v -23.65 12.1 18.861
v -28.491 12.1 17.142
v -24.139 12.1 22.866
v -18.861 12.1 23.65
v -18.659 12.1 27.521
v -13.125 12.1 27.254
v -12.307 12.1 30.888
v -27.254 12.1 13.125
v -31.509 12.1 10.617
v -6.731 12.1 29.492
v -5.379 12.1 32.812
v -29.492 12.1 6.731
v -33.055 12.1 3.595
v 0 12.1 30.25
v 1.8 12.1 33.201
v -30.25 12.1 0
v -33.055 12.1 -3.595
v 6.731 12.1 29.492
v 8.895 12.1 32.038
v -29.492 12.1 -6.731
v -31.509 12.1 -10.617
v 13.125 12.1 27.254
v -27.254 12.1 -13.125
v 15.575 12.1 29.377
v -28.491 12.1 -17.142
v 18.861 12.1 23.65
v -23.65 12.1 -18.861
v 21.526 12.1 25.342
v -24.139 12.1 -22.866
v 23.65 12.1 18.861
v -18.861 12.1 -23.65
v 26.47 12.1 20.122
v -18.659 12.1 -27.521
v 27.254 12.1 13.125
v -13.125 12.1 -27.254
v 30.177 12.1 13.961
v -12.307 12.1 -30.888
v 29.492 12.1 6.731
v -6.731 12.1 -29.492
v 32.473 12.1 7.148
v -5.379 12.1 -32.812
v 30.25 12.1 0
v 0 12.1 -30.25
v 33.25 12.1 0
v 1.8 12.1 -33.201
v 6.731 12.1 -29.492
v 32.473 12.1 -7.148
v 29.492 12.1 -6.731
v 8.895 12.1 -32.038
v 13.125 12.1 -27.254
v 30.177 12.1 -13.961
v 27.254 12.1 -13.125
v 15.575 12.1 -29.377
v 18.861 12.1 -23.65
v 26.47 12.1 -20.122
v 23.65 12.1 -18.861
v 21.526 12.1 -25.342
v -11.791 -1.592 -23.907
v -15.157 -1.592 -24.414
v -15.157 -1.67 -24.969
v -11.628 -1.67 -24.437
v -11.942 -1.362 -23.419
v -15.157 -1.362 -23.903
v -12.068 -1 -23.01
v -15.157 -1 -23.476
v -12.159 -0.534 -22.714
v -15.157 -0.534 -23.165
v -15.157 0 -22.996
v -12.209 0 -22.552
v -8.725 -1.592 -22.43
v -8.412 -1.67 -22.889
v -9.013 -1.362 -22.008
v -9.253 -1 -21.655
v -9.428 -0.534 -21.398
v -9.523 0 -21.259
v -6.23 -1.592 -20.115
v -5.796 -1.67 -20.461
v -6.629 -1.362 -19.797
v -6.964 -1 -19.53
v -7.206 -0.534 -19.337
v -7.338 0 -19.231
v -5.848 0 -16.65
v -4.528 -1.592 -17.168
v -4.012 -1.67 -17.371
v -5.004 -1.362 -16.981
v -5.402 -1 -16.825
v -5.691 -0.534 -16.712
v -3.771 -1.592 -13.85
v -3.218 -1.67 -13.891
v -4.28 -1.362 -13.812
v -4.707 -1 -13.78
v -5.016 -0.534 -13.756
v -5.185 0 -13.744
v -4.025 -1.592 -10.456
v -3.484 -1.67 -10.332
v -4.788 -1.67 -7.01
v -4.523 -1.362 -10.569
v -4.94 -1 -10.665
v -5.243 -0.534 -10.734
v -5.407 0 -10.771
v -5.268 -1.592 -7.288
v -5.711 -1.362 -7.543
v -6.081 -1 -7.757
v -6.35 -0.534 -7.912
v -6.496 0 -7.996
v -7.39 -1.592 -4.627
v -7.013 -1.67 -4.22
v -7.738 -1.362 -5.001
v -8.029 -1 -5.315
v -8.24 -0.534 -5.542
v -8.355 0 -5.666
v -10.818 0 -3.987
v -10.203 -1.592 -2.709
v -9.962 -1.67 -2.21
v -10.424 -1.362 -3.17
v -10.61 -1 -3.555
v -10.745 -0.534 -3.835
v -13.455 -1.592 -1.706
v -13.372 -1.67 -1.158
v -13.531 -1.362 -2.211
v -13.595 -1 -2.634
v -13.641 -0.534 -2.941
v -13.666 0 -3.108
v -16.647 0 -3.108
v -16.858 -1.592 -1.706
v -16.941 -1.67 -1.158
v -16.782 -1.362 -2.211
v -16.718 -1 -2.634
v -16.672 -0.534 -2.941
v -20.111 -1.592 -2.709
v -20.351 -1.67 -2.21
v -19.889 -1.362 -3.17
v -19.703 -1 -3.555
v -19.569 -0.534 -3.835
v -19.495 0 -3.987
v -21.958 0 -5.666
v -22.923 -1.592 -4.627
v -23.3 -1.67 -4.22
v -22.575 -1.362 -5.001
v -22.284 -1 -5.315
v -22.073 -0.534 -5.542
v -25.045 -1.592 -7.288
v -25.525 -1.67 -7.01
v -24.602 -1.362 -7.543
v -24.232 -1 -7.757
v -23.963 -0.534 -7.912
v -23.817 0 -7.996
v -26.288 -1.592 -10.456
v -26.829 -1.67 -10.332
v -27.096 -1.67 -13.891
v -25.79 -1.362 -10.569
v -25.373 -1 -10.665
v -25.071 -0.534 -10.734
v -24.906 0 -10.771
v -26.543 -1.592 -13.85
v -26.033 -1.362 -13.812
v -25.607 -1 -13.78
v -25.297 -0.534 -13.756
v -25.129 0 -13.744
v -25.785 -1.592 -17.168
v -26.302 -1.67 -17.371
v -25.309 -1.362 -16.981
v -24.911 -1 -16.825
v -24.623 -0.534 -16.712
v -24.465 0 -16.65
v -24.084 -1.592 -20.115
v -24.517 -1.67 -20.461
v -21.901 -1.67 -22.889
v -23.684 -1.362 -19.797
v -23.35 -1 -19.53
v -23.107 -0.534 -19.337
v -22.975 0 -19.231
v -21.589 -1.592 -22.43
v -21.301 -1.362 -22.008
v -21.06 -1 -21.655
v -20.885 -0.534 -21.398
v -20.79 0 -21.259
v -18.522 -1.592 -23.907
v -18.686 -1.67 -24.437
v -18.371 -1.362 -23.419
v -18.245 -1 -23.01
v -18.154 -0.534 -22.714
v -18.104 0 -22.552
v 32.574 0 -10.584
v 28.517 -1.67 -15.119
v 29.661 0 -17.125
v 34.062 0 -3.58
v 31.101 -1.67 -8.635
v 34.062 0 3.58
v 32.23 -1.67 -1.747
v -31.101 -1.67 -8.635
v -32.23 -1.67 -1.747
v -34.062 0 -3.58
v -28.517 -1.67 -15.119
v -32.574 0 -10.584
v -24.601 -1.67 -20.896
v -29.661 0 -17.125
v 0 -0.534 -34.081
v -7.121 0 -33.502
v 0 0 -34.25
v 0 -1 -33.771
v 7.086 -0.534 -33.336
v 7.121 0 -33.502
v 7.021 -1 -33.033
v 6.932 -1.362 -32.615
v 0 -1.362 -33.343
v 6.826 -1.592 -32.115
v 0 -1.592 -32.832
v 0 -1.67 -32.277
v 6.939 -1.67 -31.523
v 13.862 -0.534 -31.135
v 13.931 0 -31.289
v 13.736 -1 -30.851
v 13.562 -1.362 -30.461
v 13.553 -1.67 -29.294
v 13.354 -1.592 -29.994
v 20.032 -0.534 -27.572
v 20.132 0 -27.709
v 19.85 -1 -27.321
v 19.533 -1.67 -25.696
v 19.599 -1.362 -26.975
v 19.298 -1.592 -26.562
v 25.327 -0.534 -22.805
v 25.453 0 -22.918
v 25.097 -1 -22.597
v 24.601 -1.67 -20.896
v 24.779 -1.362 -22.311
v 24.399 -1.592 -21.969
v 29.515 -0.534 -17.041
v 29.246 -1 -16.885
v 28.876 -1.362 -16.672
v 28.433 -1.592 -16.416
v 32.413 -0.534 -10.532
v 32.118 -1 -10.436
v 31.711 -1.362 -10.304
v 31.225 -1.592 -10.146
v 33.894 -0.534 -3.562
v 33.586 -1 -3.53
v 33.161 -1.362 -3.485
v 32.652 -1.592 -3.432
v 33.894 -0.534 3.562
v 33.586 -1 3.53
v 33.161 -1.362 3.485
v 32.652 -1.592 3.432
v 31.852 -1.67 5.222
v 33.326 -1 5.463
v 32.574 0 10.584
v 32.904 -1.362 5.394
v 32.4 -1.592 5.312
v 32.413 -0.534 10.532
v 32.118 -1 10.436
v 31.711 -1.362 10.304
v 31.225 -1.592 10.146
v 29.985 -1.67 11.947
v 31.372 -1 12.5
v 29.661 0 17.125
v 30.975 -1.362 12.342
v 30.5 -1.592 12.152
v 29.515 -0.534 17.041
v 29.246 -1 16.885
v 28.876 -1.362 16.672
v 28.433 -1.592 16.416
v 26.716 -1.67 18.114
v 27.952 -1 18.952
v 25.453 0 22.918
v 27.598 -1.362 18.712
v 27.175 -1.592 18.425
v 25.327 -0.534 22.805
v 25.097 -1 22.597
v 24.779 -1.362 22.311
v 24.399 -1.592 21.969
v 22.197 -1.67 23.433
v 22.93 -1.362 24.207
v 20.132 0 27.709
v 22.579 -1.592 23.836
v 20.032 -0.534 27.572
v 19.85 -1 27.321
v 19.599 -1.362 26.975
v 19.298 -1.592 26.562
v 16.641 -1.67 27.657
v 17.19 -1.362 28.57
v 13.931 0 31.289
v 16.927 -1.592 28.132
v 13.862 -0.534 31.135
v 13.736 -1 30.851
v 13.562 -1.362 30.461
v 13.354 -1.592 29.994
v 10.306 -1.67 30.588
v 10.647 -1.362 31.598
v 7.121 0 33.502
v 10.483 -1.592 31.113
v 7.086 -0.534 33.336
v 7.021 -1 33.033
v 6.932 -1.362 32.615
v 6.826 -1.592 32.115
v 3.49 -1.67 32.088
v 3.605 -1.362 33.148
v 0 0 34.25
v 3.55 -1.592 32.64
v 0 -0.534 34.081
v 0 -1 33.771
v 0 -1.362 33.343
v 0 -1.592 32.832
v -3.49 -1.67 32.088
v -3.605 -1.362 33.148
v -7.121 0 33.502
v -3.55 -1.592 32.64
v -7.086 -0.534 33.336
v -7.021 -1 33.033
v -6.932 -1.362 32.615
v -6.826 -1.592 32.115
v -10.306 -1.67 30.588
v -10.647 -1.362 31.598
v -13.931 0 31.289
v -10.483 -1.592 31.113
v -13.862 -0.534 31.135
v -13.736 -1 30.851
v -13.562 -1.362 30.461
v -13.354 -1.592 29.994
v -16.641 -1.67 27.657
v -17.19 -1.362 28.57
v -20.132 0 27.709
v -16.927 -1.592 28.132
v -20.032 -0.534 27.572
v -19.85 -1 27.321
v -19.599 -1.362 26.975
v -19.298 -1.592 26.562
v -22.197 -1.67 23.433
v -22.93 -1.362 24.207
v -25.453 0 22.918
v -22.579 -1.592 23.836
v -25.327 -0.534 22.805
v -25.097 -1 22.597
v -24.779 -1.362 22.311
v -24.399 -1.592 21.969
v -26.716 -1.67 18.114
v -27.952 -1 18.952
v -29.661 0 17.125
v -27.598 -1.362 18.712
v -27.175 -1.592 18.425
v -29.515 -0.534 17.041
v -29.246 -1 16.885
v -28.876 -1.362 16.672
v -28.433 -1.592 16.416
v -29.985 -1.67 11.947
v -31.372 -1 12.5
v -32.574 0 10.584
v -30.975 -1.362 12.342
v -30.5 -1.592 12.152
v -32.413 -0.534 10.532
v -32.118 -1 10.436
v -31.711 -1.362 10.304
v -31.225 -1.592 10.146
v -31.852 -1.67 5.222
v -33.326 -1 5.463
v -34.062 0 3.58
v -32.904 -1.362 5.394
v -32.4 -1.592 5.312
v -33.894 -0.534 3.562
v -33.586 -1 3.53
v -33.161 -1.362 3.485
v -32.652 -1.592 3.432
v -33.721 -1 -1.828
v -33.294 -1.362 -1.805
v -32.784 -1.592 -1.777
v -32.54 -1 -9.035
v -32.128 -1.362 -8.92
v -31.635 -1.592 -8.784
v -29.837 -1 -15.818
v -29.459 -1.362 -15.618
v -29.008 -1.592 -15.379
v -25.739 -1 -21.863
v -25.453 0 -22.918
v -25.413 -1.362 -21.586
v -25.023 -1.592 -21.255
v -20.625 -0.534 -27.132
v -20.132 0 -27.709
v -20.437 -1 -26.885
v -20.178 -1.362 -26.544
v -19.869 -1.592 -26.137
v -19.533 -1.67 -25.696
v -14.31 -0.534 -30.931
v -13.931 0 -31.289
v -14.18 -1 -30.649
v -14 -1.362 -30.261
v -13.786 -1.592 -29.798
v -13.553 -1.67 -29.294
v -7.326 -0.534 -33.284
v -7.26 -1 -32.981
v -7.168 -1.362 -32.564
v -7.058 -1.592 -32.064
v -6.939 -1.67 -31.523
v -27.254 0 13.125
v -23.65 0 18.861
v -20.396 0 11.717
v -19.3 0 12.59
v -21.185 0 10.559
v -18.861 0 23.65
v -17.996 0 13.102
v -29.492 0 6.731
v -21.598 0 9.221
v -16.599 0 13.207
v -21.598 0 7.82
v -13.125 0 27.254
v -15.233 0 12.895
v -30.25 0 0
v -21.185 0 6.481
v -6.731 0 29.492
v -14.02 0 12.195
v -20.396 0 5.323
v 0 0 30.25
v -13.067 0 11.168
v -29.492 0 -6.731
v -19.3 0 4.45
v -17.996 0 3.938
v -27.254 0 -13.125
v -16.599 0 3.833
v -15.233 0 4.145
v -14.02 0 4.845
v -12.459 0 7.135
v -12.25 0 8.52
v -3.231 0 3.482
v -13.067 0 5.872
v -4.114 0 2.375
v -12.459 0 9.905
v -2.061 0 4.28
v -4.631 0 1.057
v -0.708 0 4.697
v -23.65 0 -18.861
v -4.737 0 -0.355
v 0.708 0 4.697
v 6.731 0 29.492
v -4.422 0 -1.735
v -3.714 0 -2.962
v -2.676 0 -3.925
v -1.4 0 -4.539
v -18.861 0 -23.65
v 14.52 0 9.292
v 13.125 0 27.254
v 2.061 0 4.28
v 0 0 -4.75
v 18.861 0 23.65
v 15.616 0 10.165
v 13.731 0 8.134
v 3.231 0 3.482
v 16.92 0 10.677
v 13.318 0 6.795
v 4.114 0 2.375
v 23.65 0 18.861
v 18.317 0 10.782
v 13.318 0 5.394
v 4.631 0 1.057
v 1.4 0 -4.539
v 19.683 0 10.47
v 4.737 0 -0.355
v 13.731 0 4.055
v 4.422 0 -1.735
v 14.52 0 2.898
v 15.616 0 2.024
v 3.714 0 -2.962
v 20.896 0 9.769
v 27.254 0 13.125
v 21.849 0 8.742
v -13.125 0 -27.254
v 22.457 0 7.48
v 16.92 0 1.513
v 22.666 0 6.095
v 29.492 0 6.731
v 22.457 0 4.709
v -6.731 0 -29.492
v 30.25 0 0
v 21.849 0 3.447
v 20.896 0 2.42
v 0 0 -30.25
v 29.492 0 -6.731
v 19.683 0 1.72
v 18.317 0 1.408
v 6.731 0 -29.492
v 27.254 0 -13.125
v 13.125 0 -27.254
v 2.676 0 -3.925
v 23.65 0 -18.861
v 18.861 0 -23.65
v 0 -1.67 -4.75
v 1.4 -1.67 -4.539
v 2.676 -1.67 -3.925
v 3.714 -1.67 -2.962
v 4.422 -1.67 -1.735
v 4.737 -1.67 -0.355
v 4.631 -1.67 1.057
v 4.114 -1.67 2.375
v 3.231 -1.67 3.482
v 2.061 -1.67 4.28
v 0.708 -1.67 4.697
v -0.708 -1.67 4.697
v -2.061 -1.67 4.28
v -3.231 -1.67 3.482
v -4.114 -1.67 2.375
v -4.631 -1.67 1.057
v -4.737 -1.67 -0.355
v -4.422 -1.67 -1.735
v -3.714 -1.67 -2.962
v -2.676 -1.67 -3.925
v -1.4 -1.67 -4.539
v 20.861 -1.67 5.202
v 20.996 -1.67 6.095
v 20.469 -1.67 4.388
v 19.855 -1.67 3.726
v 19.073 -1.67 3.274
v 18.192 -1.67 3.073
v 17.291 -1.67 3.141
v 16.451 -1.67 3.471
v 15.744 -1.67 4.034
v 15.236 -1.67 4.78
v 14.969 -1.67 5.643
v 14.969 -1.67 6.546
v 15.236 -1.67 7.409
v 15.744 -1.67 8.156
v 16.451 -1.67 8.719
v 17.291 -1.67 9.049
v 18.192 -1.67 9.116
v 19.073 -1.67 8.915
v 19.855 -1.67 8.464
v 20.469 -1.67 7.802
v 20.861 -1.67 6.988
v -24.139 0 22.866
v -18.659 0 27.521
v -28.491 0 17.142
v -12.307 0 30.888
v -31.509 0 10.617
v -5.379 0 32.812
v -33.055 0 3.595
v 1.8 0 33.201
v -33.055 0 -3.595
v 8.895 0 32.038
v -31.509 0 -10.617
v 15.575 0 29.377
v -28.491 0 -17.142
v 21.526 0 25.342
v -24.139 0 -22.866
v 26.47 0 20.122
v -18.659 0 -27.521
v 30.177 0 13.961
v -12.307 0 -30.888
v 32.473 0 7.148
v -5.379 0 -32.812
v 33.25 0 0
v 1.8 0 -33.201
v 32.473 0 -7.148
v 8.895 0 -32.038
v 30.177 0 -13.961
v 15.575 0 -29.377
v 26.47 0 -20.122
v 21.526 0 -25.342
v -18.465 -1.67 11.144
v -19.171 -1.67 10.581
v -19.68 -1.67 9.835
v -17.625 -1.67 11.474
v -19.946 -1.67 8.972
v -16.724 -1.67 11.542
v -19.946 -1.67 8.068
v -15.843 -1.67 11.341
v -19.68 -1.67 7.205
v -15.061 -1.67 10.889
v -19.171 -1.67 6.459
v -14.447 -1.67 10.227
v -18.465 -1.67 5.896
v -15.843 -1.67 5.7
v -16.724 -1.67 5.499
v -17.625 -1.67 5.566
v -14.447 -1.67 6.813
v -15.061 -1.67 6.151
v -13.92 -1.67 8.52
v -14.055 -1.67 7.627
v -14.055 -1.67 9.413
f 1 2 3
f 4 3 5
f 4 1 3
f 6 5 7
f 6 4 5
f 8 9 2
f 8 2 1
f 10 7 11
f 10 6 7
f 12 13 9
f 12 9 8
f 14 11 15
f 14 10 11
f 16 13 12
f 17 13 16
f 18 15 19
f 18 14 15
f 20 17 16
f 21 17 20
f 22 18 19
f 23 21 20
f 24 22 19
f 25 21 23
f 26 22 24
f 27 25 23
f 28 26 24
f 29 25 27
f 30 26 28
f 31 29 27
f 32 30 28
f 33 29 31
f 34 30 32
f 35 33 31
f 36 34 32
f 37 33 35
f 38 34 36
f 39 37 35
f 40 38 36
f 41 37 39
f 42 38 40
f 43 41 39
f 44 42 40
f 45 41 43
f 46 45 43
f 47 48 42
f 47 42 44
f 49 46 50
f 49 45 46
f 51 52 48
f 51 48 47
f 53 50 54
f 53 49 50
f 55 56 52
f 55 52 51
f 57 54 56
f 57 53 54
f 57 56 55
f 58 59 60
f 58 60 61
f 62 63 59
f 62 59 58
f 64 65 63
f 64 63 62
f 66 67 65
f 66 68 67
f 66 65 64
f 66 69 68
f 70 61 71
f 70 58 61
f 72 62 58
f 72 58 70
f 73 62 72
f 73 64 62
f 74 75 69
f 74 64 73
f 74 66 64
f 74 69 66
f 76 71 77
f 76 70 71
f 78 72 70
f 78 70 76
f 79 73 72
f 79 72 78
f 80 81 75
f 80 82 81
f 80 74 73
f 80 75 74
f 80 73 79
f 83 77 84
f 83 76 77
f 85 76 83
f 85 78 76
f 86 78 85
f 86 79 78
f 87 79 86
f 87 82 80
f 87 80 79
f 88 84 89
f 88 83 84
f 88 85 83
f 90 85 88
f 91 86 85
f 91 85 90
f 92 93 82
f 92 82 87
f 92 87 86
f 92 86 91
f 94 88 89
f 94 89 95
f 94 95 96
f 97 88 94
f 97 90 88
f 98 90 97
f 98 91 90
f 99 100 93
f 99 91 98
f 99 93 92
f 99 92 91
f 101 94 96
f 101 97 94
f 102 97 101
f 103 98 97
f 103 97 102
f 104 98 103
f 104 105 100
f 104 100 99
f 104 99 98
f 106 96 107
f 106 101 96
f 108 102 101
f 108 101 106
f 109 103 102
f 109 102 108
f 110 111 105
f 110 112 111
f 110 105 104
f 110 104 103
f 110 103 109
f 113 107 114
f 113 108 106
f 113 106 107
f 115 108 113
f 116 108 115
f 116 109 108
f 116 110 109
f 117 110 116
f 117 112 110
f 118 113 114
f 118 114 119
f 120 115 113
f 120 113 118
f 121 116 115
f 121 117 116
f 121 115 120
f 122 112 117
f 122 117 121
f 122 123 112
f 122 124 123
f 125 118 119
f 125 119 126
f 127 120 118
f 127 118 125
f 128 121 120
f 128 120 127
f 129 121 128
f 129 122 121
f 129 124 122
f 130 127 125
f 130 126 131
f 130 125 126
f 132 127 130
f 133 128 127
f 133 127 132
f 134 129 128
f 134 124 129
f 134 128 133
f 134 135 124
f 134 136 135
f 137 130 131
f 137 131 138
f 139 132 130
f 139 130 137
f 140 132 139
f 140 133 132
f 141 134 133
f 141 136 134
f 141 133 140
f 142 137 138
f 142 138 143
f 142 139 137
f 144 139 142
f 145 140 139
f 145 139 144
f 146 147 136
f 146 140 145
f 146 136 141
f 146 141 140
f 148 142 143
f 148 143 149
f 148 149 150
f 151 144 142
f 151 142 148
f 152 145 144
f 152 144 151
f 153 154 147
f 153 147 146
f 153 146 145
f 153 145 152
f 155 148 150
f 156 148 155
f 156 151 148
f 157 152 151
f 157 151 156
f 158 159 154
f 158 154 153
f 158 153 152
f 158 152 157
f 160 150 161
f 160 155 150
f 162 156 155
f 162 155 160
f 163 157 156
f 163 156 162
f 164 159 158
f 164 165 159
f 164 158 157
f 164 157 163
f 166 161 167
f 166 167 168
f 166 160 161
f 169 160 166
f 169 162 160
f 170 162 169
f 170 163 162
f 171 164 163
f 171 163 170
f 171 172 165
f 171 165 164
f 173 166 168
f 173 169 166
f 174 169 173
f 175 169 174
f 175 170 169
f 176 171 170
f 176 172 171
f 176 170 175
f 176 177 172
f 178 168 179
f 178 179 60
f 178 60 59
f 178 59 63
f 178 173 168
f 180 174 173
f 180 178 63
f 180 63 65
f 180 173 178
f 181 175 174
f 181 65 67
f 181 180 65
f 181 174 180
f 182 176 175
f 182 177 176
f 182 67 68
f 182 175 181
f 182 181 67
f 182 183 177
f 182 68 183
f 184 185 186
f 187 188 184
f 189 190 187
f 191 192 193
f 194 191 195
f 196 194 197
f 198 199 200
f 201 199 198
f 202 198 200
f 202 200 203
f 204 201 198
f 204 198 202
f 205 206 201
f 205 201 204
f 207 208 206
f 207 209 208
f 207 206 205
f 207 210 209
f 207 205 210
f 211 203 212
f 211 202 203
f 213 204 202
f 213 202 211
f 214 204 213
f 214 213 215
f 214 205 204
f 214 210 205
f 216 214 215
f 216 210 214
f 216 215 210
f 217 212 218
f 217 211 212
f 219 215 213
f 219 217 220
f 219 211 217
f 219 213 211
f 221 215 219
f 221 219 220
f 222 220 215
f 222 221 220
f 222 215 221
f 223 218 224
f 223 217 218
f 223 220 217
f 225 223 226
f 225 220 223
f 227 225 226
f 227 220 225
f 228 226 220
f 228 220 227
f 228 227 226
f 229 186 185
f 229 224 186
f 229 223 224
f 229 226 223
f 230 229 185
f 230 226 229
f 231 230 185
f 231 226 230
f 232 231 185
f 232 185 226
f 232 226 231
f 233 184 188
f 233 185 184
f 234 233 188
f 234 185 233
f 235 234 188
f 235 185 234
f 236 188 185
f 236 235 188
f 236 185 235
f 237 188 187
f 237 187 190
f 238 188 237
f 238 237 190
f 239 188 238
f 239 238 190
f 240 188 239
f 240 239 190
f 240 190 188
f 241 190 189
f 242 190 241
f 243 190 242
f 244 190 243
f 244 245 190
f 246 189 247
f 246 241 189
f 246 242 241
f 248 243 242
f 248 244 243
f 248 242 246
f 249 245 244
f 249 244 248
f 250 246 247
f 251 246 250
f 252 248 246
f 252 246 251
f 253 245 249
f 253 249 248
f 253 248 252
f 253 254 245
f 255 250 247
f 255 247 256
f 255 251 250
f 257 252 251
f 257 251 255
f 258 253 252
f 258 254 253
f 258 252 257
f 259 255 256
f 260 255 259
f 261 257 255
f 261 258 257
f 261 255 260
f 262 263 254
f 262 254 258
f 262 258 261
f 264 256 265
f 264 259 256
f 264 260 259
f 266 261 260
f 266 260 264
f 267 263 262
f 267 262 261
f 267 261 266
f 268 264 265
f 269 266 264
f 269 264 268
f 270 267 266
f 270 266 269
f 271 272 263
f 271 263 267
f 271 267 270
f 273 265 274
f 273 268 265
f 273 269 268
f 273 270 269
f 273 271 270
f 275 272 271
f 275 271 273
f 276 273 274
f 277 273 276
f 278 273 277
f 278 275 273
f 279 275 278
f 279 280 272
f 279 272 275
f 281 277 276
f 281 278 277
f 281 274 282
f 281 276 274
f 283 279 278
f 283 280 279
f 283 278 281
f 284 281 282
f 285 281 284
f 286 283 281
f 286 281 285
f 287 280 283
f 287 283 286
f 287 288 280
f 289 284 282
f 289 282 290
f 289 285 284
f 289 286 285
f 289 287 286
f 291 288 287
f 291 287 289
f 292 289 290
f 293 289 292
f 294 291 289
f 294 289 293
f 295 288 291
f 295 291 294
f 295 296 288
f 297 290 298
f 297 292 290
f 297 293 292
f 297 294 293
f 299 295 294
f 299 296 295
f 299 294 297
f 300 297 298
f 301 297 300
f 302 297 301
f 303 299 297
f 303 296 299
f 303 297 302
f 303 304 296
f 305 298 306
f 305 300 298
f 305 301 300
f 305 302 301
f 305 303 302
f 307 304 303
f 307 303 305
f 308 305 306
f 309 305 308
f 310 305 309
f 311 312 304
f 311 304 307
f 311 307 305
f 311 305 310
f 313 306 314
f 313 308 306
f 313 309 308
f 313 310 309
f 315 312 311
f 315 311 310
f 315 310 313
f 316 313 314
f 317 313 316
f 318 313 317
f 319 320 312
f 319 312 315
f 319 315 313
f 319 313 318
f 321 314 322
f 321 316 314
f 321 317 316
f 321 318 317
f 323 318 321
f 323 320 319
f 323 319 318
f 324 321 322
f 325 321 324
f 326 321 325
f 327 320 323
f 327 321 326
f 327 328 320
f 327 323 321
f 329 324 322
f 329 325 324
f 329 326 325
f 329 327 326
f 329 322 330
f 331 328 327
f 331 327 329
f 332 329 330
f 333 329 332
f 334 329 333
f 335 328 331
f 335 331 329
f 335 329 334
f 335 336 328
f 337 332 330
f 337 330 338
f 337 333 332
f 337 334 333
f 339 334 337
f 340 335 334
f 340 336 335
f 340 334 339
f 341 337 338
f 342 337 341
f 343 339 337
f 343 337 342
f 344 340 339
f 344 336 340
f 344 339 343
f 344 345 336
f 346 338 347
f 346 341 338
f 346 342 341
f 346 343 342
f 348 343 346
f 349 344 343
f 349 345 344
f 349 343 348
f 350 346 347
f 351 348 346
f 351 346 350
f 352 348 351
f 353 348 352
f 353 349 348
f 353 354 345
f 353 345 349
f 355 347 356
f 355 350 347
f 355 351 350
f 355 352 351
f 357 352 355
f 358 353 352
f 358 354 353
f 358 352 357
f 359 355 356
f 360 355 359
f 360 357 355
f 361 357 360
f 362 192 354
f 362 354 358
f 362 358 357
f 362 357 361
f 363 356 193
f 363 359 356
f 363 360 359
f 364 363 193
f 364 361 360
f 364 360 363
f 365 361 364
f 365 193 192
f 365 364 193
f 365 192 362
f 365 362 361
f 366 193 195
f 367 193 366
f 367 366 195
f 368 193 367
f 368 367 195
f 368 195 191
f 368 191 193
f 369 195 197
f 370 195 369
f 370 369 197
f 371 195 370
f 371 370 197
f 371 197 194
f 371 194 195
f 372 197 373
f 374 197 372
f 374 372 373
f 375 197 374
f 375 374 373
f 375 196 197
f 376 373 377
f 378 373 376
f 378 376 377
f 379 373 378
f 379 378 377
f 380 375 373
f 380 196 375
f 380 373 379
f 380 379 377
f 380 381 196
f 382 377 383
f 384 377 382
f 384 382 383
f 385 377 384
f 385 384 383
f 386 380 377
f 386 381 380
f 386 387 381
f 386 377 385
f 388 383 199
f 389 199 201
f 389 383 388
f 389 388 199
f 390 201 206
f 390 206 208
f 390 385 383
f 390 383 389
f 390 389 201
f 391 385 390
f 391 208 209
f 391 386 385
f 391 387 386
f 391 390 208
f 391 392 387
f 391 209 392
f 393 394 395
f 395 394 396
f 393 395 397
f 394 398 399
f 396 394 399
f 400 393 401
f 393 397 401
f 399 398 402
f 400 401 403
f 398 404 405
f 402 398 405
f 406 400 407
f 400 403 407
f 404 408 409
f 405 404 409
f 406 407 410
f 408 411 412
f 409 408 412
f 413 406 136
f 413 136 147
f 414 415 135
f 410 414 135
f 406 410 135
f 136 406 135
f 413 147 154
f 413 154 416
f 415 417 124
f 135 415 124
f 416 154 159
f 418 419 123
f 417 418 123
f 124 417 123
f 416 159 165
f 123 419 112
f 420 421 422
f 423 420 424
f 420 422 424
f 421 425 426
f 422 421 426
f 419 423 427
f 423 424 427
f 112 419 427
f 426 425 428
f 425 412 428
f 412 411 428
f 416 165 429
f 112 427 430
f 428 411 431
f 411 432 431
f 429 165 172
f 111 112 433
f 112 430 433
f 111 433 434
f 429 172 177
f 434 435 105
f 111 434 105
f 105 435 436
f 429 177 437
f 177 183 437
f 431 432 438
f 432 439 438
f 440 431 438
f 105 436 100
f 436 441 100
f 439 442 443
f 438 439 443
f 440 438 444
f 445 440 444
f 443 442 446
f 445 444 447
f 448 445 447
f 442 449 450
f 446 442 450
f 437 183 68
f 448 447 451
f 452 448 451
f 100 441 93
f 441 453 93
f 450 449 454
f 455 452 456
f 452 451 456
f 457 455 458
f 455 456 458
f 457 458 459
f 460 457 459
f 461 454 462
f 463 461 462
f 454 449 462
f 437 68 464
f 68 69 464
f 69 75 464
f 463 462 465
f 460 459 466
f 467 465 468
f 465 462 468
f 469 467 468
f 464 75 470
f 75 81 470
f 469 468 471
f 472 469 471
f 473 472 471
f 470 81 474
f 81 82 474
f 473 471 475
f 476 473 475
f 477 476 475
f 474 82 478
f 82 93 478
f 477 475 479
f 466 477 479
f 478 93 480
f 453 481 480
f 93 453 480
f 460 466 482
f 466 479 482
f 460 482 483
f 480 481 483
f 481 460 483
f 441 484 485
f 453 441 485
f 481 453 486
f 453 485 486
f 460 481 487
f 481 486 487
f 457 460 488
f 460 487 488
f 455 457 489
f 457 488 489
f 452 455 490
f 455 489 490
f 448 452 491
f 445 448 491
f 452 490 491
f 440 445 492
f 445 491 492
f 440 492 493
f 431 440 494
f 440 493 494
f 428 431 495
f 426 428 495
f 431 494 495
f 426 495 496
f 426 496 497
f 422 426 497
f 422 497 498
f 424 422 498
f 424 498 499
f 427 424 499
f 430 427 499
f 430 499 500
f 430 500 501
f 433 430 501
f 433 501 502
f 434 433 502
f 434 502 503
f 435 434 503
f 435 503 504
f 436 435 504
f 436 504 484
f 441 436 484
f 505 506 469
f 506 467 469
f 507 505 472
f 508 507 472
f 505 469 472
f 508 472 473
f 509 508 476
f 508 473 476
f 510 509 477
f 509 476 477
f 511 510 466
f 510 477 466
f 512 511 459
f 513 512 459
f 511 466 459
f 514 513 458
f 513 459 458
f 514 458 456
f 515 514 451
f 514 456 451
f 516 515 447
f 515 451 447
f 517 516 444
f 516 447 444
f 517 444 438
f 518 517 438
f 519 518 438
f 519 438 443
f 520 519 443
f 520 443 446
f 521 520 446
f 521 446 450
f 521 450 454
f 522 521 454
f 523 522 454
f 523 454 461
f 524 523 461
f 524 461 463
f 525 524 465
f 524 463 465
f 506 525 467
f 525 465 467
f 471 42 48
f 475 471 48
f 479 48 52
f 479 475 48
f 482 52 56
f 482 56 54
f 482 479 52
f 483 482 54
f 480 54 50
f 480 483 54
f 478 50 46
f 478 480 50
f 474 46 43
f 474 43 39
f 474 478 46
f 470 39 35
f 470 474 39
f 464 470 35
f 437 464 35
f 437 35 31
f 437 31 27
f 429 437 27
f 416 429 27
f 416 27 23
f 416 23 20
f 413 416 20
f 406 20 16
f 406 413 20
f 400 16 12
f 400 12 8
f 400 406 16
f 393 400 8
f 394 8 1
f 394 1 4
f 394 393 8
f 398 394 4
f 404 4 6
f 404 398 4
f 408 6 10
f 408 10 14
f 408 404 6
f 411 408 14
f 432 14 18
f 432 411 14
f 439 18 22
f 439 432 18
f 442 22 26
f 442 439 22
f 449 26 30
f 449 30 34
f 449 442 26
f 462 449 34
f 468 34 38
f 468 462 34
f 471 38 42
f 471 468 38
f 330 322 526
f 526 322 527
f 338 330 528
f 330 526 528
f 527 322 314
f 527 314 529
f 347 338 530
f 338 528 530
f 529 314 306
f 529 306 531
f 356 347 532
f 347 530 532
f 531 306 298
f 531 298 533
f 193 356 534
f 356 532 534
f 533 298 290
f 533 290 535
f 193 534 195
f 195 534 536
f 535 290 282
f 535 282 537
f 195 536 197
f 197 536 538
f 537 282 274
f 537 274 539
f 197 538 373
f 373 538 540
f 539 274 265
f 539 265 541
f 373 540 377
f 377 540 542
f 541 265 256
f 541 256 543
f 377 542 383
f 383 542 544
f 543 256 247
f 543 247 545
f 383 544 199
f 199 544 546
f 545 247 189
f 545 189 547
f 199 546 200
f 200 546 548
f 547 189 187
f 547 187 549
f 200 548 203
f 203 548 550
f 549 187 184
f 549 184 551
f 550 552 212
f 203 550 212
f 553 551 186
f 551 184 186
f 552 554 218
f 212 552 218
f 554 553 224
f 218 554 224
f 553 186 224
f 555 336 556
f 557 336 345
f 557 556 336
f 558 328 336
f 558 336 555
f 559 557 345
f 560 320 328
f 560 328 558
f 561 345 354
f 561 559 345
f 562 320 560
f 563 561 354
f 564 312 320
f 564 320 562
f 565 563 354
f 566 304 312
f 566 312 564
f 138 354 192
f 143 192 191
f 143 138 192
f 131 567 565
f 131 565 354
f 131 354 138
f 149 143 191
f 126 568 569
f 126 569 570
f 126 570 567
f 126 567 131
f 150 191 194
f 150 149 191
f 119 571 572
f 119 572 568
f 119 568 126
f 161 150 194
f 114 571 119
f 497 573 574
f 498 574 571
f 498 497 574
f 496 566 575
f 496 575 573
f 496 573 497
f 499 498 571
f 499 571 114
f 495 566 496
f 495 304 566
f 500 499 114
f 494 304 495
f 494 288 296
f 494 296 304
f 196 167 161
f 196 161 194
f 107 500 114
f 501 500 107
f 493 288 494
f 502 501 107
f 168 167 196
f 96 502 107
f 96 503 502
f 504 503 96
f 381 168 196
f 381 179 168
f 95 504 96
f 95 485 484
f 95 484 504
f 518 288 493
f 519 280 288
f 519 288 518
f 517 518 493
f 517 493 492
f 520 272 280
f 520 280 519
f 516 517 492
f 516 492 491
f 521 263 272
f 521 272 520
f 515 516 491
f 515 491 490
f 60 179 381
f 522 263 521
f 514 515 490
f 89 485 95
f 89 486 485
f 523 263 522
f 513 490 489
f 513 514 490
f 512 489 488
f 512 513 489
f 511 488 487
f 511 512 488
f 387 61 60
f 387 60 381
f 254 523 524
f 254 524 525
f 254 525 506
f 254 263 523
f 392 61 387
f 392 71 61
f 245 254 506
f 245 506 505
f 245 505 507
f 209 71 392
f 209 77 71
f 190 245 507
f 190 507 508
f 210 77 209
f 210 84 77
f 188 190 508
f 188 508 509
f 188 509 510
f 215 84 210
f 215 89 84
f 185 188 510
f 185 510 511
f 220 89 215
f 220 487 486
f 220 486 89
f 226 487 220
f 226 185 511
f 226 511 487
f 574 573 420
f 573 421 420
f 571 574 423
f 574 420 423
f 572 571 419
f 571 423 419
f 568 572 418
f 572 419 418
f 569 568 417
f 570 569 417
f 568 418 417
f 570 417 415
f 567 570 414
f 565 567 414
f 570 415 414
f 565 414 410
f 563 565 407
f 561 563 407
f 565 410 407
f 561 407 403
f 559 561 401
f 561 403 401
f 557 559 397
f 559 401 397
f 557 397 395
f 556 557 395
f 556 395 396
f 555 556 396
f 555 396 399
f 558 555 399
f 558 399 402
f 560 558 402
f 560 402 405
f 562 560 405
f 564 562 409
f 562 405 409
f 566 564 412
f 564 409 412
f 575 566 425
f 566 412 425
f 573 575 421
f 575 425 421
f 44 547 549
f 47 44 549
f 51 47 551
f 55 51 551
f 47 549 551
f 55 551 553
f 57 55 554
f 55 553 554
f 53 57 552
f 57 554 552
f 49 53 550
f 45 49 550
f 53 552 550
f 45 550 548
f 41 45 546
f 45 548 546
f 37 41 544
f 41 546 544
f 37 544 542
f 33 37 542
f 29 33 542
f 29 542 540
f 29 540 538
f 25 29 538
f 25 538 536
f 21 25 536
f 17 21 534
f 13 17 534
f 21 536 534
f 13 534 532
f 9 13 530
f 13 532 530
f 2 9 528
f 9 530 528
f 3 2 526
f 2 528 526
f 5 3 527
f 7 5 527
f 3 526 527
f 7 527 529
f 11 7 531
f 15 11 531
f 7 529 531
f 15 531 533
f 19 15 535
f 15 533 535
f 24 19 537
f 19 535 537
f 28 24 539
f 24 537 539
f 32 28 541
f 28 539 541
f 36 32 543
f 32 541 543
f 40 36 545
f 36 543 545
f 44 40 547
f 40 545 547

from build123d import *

# Parameters (mm, degrees)
SKETCH1_R           = 33.25
SKETCH1_R_2         = 30.25
EXTRUDE_THIN5_DEPTH = 12.1
SKETCH2_R           = 34.25
BOSS_EXTRUDE1_DEPTH = 1.67
SKETCH3_R           = 4.75
CUT_EXTRUDE1_DEPTH  = 2
SKETCH6_R           = 10
CUT_EXTRUDE4_DEPTH  = 2
FILLET1_R           = 2
FILLET2_R           = 2
SKETCH13_R          = 1.75
CUT_EXTRUDE6_DEPTH  = 5


# Read off the part's stored shape, not the designer's step: CSK for M4 Countersunk Flat Head Screw1
with BuildPart() as part:
    # Sketch1 → Extrude-Thin5 (new body)
    with BuildSketch(Plane(origin=(0, 0, 0), x_dir=(1, 0, 0), z_dir=(0, 1, 0))):
        Circle(SKETCH1_R)
        Circle(SKETCH1_R_2, mode=Mode.SUBTRACT)
    extrude(amount=EXTRUDE_THIN5_DEPTH)

    # Sketch2 → Boss-Extrude1 (add)
    with BuildSketch(Plane.XZ):
        with Locations(Location((0, 0, 0), (0, 0, 270))):
            Circle(SKETCH2_R)
    extrude(amount=BOSS_EXTRUDE1_DEPTH)

    # Sketch3 → Cut-Extrude1 (cut)
    with BuildSketch(Plane.XZ.offset(1.67)):
        with Locations(Location((0, 0, 0), (0, 0, 270))):
            Circle(SKETCH3_R)
    extrude(amount=-CUT_EXTRUDE1_DEPTH, mode=Mode.SUBTRACT)

    # Sketch6 → Cut-Extrude4 (cut)
    with BuildSketch(Plane.XZ.offset(1.67)):
        with Locations(Location((-15.156619939, -12.99647525, 0), (0, 0, 270))):
            Circle(SKETCH6_R)
    extrude(amount=-CUT_EXTRUDE4_DEPTH, mode=Mode.SUBTRACT)

    # Fillet1
    # the kernel refuses this fillet: 2 mm, written as the material it takes off along each edge
    with BuildSketch(Plane(origin=(0, -1.67, 0), x_dir=(0, 0, -1), z_dir=(-1, 0, 0))) as fillet1_piece_1:
        with BuildLine():
            CenterArc((32.277412866, -2), FILLET1_R, 9.497234469, 80.502765531)
            Line((32.277412866, 0), (32.277412866, 0.04))
            Line((32.277412866, 0.04), (34.25, 0.04))
            Line((34.25, 0.04), (34.29, 0))
            ThreePointArc((34.29, 0), (34.29, -0.835), (34.289451743, -1.6634))
            Line((34.289451743, -1.6634), (34.25, -1.67))
        make_face()
    revolve(axis=Axis((0, -1.67, 0), (0, -1, 0)), mode=Mode.SUBTRACT)

    # Fillet2
    # the kernel refuses this fillet: 2 mm, written as the material it takes off along each edge
    with BuildSketch(Plane(origin=(-15.156619939, -1.67, -12.99647525), x_dir=(0, 0, -1), z_dir=(-1, 0, 0))) as fillet2_piece_1:
        with BuildLine():
            CenterArc((11.972587134, -2), FILLET2_R, 90, 80.502765531)
            Line((10, -1.67), (9.960548257, -1.6634))
            ThreePointArc((9.960548257, -1.6634), (9.96, -0.835), (9.96, 0))
            Line((9.96, 0), (10, 0.04))
            Line((10, 0.04), (11.972587134, 0.04))
            Line((11.972587134, 0.04), (11.972587134, 0))
        make_face()
    revolve(axis=Axis((-15.156619939, -1.67, -12.99647525), (0, -1, 0)), mode=Mode.SUBTRACT)

    # Sketch13 → Cut-Extrude6 (cut)
    with BuildSketch(Plane.XZ.offset(1.67)):
        with Locations(Location((-16.950332705, 8.520084869, 0), (0, 0, 270))):
            Circle(SKETCH13_R)
        with Locations(Location((17.965530419, 6.094697839, 0), (0, 0, 270))):
            Circle(SKETCH13_R)
    extrude(amount=-CUT_EXTRUDE6_DEPTH, mode=Mode.SUBTRACT)

    # CSK for M4 Countersunk Flat Head Scr 2 → CSK for M4 Countersunk Flat Head Screw1 (revolve, cut)
    with BuildSketch(Plane(origin=(17.965530419, 0, 6.094697839), x_dir=(1, 0, 0), z_dir=(0, 0, 1))):
        Polygon((4.7, 0), (1.75, 0), (1.75, -1.67), (3.03, -1.67), align=None)
    revolve(axis=Axis((17.965530419, 0, 6.094697839), (0, 1, 0)), mode=Mode.SUBTRACT)

    # CSK for M4 Countersunk Flat Head Scr 3 o → CSK for M4 Countersunk Flat Head Scr 3 (revolve, cut)
    with BuildSketch(Plane(origin=(-16.950332705, 0, 8.520084869), x_dir=(1, 0, 0), z_dir=(0, 0, 1))):
        Polygon((4.7, 0), (1.75, 0), (1.75, -1.67), (3.03, -1.67), align=None)
    revolve(axis=Axis((-16.950332705, 0, 8.520084869), (0, 1, 0)), mode=Mode.SUBTRACT)


solid = part.part
